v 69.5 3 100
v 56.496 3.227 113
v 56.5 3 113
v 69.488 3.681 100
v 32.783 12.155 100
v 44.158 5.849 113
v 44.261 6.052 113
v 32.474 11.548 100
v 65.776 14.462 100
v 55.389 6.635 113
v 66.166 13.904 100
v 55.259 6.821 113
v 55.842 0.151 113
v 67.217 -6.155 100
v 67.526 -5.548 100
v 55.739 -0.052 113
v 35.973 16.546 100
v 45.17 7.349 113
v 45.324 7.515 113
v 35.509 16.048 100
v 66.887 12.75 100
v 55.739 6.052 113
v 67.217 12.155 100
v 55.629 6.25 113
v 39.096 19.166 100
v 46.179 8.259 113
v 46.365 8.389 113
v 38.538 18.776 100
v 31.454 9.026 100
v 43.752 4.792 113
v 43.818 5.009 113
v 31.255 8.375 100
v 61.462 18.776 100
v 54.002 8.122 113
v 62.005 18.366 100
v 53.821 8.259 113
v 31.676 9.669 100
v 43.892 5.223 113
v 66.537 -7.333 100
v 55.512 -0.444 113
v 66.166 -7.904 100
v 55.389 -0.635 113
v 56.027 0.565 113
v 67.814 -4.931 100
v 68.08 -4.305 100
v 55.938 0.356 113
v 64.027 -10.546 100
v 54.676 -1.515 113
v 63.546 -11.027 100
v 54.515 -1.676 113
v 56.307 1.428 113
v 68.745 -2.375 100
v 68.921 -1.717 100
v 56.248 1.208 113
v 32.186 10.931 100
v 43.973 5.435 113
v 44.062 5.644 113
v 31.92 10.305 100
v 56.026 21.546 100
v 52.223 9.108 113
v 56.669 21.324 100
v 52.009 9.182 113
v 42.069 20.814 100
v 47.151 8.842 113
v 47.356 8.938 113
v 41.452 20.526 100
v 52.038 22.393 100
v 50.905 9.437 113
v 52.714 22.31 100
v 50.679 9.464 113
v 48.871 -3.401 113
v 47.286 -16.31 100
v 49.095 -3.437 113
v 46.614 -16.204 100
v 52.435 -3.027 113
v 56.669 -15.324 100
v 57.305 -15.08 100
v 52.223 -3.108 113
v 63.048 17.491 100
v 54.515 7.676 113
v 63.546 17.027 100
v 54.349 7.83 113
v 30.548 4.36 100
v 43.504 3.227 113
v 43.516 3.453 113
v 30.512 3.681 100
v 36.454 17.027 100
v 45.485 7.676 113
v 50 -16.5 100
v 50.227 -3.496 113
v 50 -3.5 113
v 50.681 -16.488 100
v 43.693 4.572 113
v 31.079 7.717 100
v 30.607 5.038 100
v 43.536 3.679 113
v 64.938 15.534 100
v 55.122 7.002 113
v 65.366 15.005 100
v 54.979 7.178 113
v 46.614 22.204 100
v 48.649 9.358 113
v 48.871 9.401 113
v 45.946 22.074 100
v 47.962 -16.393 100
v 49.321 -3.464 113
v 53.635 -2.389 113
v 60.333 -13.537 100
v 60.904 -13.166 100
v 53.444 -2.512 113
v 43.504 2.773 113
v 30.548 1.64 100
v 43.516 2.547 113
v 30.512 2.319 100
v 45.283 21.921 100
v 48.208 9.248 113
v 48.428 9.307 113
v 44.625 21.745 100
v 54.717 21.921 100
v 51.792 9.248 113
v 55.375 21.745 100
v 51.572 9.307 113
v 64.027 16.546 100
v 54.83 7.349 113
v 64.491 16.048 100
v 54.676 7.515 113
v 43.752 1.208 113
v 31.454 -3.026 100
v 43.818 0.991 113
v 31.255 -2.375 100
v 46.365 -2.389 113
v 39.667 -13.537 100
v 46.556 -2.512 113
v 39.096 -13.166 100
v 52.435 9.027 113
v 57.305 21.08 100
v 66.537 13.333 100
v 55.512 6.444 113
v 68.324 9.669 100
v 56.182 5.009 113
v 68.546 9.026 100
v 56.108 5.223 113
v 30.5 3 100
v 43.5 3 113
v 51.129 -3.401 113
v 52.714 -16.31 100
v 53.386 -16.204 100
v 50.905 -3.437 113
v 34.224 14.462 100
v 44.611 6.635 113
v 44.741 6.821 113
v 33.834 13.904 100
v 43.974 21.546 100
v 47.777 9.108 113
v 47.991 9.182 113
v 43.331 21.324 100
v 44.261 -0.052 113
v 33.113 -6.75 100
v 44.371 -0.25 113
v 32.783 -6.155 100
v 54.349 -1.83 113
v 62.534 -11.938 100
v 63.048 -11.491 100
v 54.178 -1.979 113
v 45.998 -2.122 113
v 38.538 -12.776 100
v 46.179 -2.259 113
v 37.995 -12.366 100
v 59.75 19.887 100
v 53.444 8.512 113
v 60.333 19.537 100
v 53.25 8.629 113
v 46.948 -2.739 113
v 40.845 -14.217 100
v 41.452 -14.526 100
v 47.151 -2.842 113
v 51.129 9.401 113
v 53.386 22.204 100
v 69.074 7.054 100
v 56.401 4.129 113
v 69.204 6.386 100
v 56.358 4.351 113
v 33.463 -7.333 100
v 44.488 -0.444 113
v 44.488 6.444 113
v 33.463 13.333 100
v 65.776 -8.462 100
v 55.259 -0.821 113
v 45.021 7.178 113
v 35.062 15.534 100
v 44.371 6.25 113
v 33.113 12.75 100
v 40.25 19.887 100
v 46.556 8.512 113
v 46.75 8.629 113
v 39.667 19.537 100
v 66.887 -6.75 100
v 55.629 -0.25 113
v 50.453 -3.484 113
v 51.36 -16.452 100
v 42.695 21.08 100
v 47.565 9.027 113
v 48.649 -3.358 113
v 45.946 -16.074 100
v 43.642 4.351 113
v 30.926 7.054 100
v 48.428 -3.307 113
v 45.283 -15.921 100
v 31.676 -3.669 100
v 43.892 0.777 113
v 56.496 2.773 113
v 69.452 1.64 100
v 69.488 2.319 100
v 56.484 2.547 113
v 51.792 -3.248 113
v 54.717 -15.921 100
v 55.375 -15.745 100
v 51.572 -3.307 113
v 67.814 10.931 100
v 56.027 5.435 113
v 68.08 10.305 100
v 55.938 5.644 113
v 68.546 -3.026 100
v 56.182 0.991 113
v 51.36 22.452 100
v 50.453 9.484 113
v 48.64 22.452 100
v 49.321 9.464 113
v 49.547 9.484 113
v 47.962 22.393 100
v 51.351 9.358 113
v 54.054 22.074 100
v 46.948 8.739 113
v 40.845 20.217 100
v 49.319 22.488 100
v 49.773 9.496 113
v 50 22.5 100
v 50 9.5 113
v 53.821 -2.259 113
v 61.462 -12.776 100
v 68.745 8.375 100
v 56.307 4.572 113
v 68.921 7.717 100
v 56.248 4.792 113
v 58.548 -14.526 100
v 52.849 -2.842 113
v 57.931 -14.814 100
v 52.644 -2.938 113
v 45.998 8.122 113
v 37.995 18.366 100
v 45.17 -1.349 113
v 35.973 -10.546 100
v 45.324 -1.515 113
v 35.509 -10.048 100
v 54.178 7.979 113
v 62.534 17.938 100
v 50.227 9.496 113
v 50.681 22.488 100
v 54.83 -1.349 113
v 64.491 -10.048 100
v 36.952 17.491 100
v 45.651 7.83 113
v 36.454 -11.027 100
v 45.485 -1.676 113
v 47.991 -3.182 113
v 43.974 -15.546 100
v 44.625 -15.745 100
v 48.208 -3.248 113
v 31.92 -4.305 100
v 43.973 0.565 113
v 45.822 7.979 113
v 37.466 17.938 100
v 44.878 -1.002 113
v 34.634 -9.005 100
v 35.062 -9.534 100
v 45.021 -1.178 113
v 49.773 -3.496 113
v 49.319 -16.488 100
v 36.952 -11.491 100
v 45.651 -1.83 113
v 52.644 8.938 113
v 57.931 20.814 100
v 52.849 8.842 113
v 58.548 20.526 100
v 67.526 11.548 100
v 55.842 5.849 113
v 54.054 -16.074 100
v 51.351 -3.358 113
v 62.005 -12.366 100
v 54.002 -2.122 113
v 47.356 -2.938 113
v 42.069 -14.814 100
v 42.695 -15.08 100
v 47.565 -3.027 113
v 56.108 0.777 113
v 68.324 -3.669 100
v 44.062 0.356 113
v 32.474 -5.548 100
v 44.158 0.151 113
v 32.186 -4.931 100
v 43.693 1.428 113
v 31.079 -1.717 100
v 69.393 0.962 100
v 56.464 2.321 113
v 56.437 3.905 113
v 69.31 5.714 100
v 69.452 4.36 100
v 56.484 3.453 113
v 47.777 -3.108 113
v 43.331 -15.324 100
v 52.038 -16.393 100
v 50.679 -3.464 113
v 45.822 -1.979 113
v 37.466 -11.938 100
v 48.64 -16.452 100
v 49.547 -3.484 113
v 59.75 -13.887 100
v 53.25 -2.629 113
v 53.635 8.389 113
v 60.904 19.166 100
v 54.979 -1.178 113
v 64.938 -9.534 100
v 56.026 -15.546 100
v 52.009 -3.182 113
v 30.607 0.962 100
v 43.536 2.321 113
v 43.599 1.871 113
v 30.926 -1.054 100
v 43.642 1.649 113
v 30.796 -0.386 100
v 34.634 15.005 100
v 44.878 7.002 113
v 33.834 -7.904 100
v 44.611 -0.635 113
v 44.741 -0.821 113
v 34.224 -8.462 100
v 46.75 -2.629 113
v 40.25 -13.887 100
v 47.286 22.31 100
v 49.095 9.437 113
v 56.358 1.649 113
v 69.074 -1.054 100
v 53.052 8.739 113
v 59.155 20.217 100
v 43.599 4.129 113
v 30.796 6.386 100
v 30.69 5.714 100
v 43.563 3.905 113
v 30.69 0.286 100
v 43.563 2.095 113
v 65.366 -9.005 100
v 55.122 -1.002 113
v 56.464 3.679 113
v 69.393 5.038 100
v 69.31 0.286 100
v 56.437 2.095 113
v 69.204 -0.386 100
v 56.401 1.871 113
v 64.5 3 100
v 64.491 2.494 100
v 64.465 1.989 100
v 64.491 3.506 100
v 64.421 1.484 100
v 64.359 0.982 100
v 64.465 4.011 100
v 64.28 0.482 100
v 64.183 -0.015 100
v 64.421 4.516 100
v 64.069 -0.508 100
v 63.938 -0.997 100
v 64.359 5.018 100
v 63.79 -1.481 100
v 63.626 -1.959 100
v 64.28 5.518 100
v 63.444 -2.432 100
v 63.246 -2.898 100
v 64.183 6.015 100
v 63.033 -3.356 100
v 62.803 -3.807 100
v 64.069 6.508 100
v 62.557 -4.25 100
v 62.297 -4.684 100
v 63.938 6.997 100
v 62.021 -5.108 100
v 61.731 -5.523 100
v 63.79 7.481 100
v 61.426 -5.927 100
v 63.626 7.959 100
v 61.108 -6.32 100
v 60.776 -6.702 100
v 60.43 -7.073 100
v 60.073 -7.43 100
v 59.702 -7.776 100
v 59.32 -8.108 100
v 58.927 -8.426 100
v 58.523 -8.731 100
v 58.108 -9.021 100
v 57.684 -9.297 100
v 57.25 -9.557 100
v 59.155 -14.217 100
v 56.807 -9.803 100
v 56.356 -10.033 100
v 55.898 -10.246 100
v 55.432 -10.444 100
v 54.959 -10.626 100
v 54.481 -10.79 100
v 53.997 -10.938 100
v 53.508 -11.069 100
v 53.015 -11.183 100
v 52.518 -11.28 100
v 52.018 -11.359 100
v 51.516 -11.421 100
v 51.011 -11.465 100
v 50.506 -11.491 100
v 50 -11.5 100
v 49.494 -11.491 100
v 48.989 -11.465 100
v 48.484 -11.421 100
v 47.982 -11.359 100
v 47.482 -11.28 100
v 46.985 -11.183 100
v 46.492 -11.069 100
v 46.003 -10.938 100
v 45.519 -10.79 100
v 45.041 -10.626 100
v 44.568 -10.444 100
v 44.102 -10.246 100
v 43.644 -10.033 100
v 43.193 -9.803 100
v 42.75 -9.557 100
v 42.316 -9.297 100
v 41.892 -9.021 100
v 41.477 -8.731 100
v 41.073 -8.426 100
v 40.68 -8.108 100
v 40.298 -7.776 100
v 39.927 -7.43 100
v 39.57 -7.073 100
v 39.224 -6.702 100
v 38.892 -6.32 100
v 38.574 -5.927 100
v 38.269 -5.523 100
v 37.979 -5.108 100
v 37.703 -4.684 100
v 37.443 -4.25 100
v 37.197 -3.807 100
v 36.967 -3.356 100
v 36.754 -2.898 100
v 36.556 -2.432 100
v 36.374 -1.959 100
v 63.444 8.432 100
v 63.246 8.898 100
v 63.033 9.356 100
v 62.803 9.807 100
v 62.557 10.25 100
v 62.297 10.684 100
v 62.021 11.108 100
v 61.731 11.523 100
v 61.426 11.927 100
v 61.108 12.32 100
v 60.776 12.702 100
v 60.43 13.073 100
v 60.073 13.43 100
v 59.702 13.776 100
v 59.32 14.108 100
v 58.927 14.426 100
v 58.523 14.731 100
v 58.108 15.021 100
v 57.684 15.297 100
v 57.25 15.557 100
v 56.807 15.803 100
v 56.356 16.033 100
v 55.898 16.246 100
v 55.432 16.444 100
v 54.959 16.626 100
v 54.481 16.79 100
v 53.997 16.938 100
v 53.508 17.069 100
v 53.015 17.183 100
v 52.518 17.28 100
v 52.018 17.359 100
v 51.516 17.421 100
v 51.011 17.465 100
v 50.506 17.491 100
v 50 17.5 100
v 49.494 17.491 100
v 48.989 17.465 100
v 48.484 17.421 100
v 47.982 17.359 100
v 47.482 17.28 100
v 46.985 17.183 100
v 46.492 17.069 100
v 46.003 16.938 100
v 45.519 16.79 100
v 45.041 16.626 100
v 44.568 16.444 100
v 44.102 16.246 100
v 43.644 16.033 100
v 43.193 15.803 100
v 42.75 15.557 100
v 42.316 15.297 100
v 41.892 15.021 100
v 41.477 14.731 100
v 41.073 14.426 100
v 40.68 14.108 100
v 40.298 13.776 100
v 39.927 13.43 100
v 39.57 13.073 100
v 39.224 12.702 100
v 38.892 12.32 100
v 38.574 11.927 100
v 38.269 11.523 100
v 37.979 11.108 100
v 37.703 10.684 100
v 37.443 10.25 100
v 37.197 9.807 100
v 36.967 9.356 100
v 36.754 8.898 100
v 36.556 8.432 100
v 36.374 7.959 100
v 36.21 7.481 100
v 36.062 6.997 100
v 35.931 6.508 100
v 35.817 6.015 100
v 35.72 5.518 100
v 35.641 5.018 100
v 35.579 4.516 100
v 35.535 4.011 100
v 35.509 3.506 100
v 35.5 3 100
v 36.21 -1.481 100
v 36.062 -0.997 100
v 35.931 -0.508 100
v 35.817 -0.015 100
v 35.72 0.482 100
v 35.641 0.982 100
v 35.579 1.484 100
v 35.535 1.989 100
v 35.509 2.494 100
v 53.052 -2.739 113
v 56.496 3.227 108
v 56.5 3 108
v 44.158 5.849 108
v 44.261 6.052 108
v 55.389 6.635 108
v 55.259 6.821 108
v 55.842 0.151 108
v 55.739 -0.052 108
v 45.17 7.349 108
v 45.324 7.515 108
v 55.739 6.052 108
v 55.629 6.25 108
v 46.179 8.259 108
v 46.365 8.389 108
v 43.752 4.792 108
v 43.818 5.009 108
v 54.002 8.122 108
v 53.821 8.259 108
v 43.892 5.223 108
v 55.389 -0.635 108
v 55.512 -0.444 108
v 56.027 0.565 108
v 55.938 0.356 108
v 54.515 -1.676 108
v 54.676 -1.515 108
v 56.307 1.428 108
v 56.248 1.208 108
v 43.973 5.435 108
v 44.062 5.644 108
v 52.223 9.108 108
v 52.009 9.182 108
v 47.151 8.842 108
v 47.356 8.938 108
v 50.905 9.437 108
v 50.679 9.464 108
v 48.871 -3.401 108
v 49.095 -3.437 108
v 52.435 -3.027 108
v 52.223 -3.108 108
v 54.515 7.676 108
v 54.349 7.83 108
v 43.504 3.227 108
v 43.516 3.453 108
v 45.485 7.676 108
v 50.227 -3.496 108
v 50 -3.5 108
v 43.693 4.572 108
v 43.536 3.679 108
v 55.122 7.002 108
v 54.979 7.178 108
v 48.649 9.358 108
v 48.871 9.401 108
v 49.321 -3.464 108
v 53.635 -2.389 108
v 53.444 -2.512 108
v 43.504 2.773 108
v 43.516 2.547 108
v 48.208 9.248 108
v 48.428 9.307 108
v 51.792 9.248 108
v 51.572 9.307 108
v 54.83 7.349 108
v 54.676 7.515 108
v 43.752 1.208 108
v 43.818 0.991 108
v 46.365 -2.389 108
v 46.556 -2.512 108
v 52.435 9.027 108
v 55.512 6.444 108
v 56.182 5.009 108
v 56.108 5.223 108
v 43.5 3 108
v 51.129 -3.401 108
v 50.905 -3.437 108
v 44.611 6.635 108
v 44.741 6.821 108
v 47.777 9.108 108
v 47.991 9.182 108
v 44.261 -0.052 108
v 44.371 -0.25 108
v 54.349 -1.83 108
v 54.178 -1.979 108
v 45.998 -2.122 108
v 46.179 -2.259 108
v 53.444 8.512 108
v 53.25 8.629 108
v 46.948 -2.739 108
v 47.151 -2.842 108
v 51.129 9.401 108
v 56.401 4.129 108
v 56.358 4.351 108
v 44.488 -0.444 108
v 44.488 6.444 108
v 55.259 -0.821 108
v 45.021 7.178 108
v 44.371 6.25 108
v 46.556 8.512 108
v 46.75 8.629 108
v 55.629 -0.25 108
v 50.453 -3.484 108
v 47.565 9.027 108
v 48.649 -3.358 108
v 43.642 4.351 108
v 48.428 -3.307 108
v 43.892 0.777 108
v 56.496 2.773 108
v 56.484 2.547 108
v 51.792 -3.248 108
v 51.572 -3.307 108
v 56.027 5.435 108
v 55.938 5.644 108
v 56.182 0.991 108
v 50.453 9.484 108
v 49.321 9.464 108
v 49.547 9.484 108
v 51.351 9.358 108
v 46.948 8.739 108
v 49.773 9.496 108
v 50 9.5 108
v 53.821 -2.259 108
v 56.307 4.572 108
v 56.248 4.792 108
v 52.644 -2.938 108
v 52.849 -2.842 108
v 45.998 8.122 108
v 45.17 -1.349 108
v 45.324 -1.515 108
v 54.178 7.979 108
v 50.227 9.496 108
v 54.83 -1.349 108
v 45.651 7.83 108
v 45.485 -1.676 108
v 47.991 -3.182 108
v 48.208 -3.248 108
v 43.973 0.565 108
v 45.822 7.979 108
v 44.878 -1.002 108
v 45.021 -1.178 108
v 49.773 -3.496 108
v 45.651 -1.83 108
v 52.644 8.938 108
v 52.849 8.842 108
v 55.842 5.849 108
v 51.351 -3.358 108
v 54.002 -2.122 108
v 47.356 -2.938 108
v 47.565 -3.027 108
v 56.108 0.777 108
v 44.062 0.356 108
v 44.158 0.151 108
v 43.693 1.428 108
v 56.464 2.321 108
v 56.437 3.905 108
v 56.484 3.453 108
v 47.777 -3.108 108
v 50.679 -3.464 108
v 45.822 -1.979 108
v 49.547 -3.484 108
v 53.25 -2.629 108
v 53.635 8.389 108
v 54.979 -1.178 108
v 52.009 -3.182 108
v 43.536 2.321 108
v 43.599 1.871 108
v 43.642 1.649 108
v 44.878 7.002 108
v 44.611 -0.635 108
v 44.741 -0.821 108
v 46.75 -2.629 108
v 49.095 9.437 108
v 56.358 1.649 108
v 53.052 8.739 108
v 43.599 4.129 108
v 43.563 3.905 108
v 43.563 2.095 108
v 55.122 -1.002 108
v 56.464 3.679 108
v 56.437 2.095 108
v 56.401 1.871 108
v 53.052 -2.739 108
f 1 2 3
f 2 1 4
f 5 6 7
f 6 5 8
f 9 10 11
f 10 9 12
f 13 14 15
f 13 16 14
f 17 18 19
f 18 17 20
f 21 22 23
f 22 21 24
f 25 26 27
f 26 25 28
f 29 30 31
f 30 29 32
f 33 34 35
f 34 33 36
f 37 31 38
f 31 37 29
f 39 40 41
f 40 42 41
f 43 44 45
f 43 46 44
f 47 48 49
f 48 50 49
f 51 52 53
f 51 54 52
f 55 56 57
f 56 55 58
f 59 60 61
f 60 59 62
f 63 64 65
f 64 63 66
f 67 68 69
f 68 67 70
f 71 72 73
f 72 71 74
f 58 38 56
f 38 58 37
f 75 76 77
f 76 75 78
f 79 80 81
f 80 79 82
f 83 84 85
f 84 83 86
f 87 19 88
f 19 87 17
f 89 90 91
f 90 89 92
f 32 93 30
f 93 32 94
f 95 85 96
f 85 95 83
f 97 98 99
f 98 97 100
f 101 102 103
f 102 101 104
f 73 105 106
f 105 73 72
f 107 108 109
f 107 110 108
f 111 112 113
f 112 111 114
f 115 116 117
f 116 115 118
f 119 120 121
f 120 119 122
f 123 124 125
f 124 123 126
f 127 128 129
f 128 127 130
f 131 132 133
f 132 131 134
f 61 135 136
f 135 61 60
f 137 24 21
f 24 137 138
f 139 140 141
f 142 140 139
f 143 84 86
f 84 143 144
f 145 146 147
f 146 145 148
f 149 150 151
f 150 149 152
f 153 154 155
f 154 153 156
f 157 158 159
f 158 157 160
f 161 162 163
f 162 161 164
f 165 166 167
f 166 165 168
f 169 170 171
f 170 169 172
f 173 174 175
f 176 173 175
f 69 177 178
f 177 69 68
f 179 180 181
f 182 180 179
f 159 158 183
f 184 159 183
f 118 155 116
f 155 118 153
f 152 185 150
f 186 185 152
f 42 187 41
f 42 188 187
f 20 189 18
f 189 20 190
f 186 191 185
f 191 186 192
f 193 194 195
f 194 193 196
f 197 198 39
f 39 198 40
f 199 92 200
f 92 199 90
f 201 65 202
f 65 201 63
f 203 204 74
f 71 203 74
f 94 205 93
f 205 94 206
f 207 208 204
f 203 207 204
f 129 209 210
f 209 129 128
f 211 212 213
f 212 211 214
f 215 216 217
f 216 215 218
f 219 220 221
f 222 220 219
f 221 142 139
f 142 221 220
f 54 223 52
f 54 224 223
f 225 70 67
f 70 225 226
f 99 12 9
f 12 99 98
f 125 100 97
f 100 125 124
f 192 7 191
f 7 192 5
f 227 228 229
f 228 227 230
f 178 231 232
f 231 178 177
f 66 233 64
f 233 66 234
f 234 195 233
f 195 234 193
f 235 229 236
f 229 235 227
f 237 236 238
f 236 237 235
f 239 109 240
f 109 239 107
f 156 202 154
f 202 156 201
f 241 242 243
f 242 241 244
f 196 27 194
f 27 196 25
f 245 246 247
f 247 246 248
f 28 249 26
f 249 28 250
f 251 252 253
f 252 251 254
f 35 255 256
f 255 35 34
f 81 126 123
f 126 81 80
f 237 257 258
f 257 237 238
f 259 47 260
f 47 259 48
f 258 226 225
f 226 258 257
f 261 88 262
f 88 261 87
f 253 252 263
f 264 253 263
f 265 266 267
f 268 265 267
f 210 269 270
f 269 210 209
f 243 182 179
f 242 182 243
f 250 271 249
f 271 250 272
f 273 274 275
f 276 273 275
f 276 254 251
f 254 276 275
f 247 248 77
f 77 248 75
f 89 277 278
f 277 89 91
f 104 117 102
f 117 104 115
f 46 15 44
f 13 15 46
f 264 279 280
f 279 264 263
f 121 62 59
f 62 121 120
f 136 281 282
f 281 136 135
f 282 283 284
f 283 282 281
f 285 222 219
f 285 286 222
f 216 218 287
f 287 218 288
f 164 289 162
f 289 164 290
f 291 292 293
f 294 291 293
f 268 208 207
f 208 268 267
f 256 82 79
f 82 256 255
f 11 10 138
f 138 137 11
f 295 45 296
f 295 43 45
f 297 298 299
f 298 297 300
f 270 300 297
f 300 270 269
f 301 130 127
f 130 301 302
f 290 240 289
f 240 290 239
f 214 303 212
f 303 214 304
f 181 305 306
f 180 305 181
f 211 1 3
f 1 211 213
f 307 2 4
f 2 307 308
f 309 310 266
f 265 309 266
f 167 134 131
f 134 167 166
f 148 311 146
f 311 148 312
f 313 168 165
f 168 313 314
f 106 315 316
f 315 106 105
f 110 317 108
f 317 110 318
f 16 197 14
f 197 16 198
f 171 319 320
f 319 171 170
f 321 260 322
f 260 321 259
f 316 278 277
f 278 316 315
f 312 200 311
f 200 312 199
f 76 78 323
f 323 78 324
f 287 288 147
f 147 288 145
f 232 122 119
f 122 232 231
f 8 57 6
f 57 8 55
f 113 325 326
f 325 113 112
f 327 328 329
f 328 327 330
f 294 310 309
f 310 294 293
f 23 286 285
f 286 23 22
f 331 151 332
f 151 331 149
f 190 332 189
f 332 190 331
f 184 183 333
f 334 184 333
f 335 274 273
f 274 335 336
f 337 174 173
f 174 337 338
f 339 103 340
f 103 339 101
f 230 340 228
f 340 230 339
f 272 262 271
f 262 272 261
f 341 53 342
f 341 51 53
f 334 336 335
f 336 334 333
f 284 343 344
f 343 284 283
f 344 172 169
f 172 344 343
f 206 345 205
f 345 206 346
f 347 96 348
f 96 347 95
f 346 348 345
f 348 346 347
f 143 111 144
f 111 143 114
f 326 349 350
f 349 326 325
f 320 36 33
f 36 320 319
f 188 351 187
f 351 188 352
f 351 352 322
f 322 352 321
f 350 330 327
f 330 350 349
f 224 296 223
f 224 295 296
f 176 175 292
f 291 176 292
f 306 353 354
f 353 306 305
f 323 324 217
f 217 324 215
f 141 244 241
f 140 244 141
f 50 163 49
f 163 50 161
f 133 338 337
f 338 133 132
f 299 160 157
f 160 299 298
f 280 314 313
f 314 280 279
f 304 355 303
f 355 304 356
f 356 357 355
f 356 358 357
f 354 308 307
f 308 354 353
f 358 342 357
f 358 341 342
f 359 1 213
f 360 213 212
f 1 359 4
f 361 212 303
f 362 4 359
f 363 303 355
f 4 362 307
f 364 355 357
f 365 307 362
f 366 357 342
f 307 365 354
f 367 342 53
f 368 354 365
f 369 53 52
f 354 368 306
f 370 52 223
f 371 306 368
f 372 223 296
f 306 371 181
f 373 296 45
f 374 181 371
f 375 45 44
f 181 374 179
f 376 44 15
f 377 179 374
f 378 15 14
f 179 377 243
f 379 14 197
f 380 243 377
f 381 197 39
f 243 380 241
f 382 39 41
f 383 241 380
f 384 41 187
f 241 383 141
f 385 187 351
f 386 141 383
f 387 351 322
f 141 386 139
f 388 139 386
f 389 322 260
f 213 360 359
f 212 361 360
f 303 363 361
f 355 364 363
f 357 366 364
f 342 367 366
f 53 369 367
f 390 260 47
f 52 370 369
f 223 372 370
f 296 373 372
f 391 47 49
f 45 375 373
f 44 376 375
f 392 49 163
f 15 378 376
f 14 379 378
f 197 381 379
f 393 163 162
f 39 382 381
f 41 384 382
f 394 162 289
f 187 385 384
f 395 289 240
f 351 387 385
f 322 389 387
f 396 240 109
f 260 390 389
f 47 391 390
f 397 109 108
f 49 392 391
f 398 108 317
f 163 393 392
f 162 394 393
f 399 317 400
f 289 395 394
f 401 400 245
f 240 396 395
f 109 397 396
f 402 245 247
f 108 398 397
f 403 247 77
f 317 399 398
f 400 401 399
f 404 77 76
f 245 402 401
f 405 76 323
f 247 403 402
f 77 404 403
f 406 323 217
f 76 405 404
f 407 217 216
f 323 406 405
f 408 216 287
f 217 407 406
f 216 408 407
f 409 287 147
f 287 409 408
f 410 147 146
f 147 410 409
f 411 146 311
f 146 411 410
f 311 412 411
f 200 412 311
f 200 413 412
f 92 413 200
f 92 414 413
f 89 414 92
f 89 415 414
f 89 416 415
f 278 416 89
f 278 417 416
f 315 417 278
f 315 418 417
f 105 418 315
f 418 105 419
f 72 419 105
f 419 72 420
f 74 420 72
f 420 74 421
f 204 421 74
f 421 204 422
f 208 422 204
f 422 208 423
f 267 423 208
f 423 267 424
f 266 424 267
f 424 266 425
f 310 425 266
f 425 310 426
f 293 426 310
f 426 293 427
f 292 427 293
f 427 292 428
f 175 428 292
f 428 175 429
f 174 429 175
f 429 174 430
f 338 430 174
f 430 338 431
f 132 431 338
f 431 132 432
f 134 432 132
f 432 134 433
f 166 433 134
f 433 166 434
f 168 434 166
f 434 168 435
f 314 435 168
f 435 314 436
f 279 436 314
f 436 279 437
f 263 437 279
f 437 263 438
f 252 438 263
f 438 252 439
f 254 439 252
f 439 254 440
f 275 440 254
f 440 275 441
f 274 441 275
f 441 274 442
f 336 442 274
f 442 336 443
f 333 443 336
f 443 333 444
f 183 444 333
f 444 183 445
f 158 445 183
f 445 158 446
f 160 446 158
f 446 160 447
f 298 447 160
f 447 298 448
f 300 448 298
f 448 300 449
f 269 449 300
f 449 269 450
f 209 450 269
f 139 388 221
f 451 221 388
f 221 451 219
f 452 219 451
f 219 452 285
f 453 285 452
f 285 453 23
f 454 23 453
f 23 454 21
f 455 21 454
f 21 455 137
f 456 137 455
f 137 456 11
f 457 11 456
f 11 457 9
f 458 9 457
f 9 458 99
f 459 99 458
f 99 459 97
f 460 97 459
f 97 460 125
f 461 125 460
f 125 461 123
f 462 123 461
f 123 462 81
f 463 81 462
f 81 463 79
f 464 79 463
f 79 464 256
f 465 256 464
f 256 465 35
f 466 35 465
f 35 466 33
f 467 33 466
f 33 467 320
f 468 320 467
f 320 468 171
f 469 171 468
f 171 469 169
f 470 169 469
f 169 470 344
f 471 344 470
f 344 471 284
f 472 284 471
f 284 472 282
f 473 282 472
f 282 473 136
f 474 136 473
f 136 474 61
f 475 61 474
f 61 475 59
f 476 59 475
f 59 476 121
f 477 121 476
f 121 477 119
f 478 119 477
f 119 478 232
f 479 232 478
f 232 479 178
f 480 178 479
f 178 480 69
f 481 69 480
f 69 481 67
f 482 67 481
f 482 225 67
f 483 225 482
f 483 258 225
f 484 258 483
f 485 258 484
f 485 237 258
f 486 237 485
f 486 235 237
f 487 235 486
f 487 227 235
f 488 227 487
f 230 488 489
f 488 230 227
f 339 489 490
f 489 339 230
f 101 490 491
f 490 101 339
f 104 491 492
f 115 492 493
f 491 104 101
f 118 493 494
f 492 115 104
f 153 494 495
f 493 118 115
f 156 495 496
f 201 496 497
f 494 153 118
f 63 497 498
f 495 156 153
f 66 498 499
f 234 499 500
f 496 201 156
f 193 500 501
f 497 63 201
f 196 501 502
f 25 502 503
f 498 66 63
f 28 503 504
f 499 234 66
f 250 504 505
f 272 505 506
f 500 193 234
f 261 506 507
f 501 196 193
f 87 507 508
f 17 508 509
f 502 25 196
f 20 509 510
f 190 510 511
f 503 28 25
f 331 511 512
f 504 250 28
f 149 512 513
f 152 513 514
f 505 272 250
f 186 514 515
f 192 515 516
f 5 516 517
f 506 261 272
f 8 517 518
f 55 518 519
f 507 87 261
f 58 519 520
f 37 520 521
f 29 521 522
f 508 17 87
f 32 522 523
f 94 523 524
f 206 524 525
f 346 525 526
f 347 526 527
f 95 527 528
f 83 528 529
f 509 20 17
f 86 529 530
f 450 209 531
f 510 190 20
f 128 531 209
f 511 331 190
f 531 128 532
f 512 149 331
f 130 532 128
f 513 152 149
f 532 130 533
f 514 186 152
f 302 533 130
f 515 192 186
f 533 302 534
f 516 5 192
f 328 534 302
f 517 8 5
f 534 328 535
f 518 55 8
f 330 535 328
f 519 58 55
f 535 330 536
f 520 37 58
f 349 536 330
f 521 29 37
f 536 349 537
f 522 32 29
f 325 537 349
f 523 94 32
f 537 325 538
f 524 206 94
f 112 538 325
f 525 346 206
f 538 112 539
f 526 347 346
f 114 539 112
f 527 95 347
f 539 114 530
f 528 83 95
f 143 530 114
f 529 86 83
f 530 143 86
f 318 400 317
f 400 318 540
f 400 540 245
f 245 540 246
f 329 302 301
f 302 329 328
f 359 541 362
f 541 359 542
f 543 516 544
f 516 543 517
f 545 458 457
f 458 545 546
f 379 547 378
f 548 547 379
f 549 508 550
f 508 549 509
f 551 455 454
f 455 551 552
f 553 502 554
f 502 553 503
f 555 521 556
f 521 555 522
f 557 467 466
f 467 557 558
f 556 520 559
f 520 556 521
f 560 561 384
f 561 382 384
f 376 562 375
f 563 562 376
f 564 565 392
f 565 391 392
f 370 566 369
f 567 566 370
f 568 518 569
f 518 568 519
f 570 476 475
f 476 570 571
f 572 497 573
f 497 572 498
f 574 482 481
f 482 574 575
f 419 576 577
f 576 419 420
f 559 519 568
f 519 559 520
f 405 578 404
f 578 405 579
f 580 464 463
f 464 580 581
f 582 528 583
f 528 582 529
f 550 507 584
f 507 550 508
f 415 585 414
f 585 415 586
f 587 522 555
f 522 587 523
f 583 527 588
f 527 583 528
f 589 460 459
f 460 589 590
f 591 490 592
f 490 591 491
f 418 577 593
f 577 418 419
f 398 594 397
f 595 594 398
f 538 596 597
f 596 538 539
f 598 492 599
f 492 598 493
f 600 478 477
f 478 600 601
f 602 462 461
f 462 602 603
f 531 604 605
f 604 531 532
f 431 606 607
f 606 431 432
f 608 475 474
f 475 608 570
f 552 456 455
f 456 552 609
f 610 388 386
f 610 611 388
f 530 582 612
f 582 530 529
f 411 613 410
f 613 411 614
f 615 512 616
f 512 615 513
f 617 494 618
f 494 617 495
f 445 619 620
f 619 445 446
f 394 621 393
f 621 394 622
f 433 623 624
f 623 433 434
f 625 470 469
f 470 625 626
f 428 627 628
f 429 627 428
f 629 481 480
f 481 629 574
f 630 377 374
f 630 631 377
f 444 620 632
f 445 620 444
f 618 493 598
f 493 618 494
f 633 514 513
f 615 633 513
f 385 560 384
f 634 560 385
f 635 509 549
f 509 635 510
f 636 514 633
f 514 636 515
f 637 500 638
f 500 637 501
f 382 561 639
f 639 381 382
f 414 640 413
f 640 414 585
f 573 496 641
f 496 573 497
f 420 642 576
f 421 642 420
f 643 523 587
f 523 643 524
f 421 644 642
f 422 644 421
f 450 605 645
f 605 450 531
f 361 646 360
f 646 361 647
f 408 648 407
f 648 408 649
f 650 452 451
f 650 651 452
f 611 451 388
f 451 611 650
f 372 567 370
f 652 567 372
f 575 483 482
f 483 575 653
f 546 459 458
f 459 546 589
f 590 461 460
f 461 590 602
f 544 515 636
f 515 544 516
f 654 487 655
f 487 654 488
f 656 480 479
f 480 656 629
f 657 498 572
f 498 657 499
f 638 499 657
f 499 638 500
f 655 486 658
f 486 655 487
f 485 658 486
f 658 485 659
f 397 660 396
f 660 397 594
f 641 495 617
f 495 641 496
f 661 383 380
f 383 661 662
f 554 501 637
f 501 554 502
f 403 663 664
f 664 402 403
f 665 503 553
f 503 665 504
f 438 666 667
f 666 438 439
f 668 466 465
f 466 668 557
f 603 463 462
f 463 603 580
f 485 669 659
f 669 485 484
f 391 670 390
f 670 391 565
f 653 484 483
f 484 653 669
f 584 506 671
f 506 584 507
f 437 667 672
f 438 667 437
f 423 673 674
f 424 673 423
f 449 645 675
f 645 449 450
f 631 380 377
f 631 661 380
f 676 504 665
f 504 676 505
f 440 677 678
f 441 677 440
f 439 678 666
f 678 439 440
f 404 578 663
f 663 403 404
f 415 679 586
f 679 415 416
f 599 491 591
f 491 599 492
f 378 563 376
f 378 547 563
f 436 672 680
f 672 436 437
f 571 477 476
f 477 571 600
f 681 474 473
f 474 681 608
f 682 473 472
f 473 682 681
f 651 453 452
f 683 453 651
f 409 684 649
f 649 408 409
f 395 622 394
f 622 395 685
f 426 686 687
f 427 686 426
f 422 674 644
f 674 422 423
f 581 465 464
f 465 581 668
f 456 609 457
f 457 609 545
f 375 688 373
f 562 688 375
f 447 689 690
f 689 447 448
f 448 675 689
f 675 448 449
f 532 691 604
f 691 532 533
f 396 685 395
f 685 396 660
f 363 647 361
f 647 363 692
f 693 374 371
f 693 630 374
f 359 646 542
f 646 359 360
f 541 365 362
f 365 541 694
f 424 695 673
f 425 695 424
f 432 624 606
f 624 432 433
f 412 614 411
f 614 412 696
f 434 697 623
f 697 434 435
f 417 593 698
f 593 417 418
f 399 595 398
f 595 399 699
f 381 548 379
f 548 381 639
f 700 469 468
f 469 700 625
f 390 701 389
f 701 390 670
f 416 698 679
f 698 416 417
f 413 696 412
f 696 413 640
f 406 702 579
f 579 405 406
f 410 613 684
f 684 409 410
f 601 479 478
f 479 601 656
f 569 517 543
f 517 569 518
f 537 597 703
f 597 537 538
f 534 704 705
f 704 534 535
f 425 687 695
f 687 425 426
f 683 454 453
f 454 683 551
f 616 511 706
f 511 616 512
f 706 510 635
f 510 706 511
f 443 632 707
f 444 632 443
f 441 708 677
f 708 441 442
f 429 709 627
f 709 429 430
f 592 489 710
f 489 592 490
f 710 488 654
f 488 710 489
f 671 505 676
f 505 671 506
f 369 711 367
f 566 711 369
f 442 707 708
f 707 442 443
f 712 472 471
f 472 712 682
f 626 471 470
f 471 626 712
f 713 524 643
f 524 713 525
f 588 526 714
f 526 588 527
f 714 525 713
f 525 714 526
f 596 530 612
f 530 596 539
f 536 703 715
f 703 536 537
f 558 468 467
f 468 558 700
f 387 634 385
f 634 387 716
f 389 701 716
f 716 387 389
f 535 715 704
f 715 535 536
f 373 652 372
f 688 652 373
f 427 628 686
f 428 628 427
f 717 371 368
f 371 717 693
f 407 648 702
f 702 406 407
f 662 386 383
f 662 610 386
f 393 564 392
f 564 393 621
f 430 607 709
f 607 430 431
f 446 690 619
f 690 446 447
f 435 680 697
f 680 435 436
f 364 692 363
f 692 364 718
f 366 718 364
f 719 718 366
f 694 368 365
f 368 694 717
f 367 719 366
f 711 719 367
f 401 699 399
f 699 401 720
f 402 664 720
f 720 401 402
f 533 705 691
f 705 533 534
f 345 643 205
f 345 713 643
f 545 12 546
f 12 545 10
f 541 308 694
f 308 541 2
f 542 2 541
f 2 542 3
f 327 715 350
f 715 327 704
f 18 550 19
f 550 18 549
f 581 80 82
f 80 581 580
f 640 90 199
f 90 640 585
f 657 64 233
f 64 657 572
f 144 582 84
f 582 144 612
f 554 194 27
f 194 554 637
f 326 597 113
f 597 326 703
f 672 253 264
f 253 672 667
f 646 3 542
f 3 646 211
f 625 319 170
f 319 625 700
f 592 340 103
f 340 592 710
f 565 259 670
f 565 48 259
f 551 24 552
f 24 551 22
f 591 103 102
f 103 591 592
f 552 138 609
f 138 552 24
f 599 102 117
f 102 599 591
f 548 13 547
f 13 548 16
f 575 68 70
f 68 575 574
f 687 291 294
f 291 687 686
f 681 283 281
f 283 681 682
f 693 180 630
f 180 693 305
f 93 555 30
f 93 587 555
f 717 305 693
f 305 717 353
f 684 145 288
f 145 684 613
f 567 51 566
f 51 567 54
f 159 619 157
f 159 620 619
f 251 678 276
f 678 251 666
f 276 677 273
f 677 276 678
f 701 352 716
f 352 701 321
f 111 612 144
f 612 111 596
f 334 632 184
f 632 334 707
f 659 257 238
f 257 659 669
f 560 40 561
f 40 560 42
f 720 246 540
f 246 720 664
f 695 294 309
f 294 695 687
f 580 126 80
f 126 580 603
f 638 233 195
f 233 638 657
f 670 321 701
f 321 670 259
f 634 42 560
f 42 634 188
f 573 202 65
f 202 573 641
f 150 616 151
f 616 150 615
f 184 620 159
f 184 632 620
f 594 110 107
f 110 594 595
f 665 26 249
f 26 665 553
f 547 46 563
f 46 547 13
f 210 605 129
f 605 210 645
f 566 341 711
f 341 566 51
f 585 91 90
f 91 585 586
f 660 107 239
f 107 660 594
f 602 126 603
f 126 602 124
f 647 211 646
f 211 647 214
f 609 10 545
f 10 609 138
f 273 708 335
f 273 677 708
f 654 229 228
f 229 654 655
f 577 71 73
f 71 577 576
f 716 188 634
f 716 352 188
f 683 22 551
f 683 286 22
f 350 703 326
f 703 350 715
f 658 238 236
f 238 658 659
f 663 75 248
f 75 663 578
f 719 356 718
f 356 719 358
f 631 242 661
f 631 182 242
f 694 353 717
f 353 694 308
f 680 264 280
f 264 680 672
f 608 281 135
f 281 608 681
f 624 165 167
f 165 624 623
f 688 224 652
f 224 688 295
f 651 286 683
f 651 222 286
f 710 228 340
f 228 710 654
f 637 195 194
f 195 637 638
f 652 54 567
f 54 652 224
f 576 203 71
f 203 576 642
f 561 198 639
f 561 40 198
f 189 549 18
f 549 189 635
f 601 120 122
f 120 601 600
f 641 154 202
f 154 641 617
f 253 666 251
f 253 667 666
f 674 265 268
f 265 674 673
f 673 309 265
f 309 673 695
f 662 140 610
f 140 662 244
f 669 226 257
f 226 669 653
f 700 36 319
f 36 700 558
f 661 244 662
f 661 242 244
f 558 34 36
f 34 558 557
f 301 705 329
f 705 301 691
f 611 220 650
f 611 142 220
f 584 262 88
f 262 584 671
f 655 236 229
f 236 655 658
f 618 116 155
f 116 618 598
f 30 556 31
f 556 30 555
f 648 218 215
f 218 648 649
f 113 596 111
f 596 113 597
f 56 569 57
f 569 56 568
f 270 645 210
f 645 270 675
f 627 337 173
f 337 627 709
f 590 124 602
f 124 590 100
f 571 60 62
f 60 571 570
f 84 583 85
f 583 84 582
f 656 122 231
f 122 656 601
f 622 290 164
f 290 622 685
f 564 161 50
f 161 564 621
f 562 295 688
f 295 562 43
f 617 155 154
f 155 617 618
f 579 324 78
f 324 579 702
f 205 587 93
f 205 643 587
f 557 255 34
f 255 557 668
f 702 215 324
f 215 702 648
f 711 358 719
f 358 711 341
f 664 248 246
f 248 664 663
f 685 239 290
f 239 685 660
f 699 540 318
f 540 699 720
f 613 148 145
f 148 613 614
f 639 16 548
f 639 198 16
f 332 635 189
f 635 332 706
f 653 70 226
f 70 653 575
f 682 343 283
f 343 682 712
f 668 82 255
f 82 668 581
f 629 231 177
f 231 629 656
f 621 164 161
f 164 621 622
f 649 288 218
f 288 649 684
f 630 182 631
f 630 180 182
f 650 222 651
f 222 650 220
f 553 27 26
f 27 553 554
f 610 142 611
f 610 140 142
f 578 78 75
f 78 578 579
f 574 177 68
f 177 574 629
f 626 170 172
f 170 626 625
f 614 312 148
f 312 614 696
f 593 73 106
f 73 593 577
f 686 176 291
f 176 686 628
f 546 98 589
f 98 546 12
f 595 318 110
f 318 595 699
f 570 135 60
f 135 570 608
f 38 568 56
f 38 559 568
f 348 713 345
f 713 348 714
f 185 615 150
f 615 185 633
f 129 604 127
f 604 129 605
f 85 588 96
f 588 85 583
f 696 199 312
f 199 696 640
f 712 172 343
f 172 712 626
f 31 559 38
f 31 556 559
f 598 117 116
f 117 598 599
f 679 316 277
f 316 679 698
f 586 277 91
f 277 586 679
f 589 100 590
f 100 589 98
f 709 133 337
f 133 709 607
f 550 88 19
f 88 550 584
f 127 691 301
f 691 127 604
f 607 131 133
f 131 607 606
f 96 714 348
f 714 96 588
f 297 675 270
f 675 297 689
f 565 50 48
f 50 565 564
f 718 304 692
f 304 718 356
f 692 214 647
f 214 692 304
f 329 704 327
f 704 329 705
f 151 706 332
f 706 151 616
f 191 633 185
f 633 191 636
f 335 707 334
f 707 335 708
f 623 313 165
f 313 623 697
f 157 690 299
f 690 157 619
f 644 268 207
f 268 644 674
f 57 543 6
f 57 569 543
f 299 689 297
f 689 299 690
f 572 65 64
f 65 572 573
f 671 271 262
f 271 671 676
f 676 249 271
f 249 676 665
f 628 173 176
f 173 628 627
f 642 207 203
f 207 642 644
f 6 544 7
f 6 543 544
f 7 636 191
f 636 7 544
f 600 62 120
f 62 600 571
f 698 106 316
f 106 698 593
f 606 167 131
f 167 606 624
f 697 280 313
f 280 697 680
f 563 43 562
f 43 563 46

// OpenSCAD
// Generated by SolidPython 1.1.1 on 2022-02-01 14:05:48
$fa = 2;
$fs = 0.1;
$fn = 0;


translate(v = [50, 3, 100.0000000000]) {
	difference() {
		cylinder(d1 = 39, d2 = 0, h = 19.5000000000);
		translate(v = [0, 0, -5]) {
			cylinder(d1 = 39, d2 = 0, h = 19.5000000000);
		}
		cylinder(d = 13, h = 29.5000000000);
	}
}
/***********************************************
*********      SolidPython code:      **********
************************************************
 
from vent import *

box_width = 60
box_height = 200#148
box_length = 180
box_shell_thickness = 5

bolt_size = 4
bolt_outer_radius = 10/2

fitting_tolerance = 1

printing_support_thickness = 0.8

bracket_thickness = box_shell_thickness
sensecap_width = 40 + 1  # +1 for easy fitting
top_bracket_offset = 27 + box_shell_thickness
top_bracket_clamp_height = 8
top_bracket_clamp_width = (box_width - sensecap_width) / 2
top_bracket_height = top_bracket_offset + top_bracket_clamp_height
top_bracket_spacing = 132
sensecap_length = 154 + 1  # +1 for easy fitting
top_bracket_side_width = (box_length - sensecap_length) / 2
top_bracket_top_length = (box_length - top_bracket_spacing)/2
bottom_bracket_clamp_length = 15
bottom_bracket_length = top_bracket_side_width + bottom_bracket_clamp_length
bottom_bracket_offset = 110

charger_length = 28
charger_width = 43
charger_height = 64
charger_plug_height = 40

power_cable_hole_diameter = 10
power_cable_hole_support_diameter = power_cable_hole_diameter + 2 * 10
eth_cable_hole_diameter = 6
eth_cable_hole_support_diameter = eth_cable_hole_diameter + 2 * 10

airial_offset_x = 50
airial_offset_y = 3
airial_diameter = 13
airial_cone_diameter = min(airial_diameter * 3, box_width)
airial_cone_height = airial_cone_diameter/2

mounting_bracket_plate_thickness = 5
mounting_bracket_plate_extra = 10
mounting_bracket_pole_diameter = 50
mounting_bracket_section_thickness = 10
mounting_bracket_length = mounting_bracket_pole_diameter / 2 + 2 * mounting_bracket_section_thickness + mounting_bracket_plate_thickness
mounting_bracket_width = mounting_bracket_pole_diameter + 2 * mounting_bracket_section_thickness
mounting_bracket_height = 3 * mounting_bracket_section_thickness
mounting_bracket_plate_height = 60 #mounting_bracket_height + 2*mounting_bracket_plate_extra +10 @ 50mm pole diameter
mounting_bracket_plate_width = 100 #mounting_bracket_width + 2*mounting_bracket_plate_extra +10 @ 50mm pole diameter
mounting_bracket_support_width = 20

# Create the box
box = cube((box_length,box_width,box_height), center=True)
box_inside =cube((box_length - 2 * box_shell_thickness, box_width, box_height), center=True)
box_inside = translate((0, 0, -box_shell_thickness))(box_inside)
outer_box = box - box_inside

# Create the vents
vent = vent_grid(box_length, box_height, box_shell_thickness, 10, 3, 2, 20)
vent1 = translate((0,(box_width-box_shell_thickness)/2,0))(vent)
vent2 = translate((0,-(box_width-box_shell_thickness)/2,0))(rotate(a=(0,0,180))(vent))
vents = vent1 + vent2

# Create the top brackets
bracket_side = cube((bracket_thickness, top_bracket_clamp_width, top_bracket_height), center=True)
translate_x = (top_bracket_spacing+bracket_thickness)/2
translate_y = (sensecap_width + top_bracket_clamp_width) / 2
translate_z = (box_height - top_bracket_height)/2
bracket_side1 = translate((translate_x,translate_y,translate_z))(bracket_side)
bracket_side2 = translate((translate_x,-translate_y,translate_z))(bracket_side)
bracket_side3 = cube((top_bracket_side_width, bracket_thickness, top_bracket_height), center=True)
bracket_side3 = translate(((box_length-top_bracket_side_width)/2,0,translate_z))(bracket_side3)
bracket_top = cube((bracket_thickness, box_width, top_bracket_offset), center=True)
bracket_top = translate((translate_x,0,(box_height - top_bracket_offset)/2))(bracket_top)
bracket_top_2 = cube((top_bracket_top_length, bracket_thickness, top_bracket_offset), center=True)
bracket_top_2 = translate(((box_length-top_bracket_top_length)/2,0,(box_height - top_bracket_offset)/2))(bracket_top_2)
bracket_1 = bracket_side1 + bracket_side2 + bracket_side3 + bracket_top + bracket_top_2
bracket_2 = rotate(a=(0,0,180))(bracket_1)

# Create the bottom brackets
bracket_clamp = cube((bottom_bracket_length, top_bracket_clamp_width, bracket_thickness), center=True)
translate_x = (box_length - bottom_bracket_length)/2
translate_y = (box_width - top_bracket_clamp_width)/2
translate_z = (box_height - bracket_thickness)/2 - bottom_bracket_offset
bracket_clamp1 = translate((translate_x,translate_y,translate_z))(bracket_clamp)
bracket_clamp2 = translate((translate_x,-translate_y,translate_z))(bracket_clamp)
bracket_bridge = cube((top_bracket_side_width, box_width, bracket_thickness), center=True)
bracket_bridge = translate(((box_length-top_bracket_side_width)/2,0,translate_z))(bracket_bridge)
bottom_bracket1 = bracket_clamp1 + bracket_clamp2 + bracket_bridge
bottom_bracket2 = rotate(a=(0,0,180))(bottom_bracket1)

# Add the brackets to the box
box_with_vents = outer_box + vents + bracket_1 + bracket_2 + bottom_bracket1 + bottom_bracket2

# Remove the large airial hole from the box
large_airial_hole = cylinder(h=airial_cone_height,d1=airial_cone_diameter,d2=0)
large_airial_hole = translate((airial_offset_x, airial_offset_y, box_height / 2 - box_shell_thickness))(large_airial_hole)
box_with_vents -=  large_airial_hole

# Create the airial cone
outer_cone = cylinder(h=airial_cone_height, d1=airial_cone_diameter, d2=0)
inner_cone = translate((0,0,-box_shell_thickness))(cylinder(h=airial_cone_height, d1=airial_cone_diameter, d2=0))
small_airial_hole = cylinder(d=airial_diameter, h=airial_cone_height+2*box_shell_thickness)
airial_cone = outer_cone - inner_cone - small_airial_hole
airial_cone = translate((airial_offset_x, airial_offset_y, box_height / 2))(airial_cone)

# Create the mounting bracket
mounting_bracket = cube((mounting_bracket_width, mounting_bracket_length, mounting_bracket_height), center=True)
pipe_hole = translate((0,-mounting_bracket_length/2,-mounting_bracket_height/2))(cylinder(d=mounting_bracket_pole_diameter,h=mounting_bracket_height))
middle_cube = cube((mounting_bracket_width, mounting_bracket_length-mounting_bracket_plate_thickness, mounting_bracket_section_thickness), center=True)
middle_cube = translate((0,-mounting_bracket_plate_thickness/2,0))(middle_cube)
middle_hole = cube((mounting_bracket_pole_diameter, mounting_bracket_pole_diameter/2, mounting_bracket_section_thickness), center=True)
middle_hole = translate((0,-mounting_bracket_pole_diameter/4,0))(middle_hole)
middle_hole += translate((0,0,-mounting_bracket_section_thickness/2))(cylinder(d=mounting_bracket_pole_diameter,h=mounting_bracket_section_thickness))
middle_hole = translate((0,-mounting_bracket_length/2 + mounting_bracket_section_thickness,0))(middle_hole)
mounting_plate = cube((mounting_bracket_plate_width, mounting_bracket_plate_thickness, mounting_bracket_plate_height), center=True)
# Add the mounting plate to the box
box_with_vents += translate((0,-(box_width-mounting_bracket_plate_thickness)/2,0))(mounting_plate)
# Add supports for the mounting plate
supp1 = cube((mounting_bracket_support_width, box_shell_thickness, box_height), center=True)
supp2 = cube((box_length, box_shell_thickness, mounting_bracket_support_width), center=True)
supps = supp1 +supp2
supps = translate((0,-(box_width-box_shell_thickness)/2,0))(supps)
box_with_vents += supps
# Create the holes for the mounting bracket
bracket_hole = down((box_shell_thickness+mounting_bracket_plate_thickness)/2)(cylinder(d=bolt_size,h=box_shell_thickness+mounting_bracket_plate_thickness))
bracket_hole = rotate(a=(90,0,0))(bracket_hole)
bracket_hole = translate((0,-box_width/2,0))(bracket_hole)
bracket_hole1 = translate(((mounting_bracket_plate_width / 2 - bolt_outer_radius), 0, (mounting_bracket_plate_height / 2 - bolt_outer_radius)))(bracket_hole)
bracket_hole2 = translate((-(mounting_bracket_plate_width / 2 - bolt_outer_radius), 0, (mounting_bracket_plate_height / 2 - bolt_outer_radius)))(bracket_hole)
bracket_hole3 = translate((-(mounting_bracket_plate_width / 2 - bolt_outer_radius), 0, -(mounting_bracket_plate_height / 2 - bolt_outer_radius)))(bracket_hole)
bracket_hole4 = translate(((mounting_bracket_plate_width / 2 - bolt_outer_radius), 0, -(mounting_bracket_plate_height / 2 - bolt_outer_radius)))(bracket_hole)
bracket_holes = bracket_hole1 + bracket_hole2 + bracket_hole3 + bracket_hole4

mounting_plate = translate((0,(mounting_bracket_length - mounting_bracket_plate_thickness)/2,0))(mounting_plate)
mounting_bracket = mounting_bracket - pipe_hole - (middle_cube-middle_hole) + mounting_plate
mounting_bracket = translate((0,-(mounting_bracket_length+box_width)/2,0))(mounting_bracket)

# Add the holes to the mounting bracket and the backplate
mounting_bracket -= bracket_holes
box_with_vents -= bracket_holes

# Create the bottom plate
bottom_plate = horizontal_vent(box_length, box_width, box_shell_thickness, 10, 3, 2)
bottom_plate = translate((0,0,-box_height/2 - box_shell_thickness/2))(bottom_plate)
bottom_plate_mounting_point = cube((bolt_outer_radius*2,bolt_outer_radius*2,box_shell_thickness),center=True)
bottom_plate_mounting_point -= translate((0,0,-box_shell_thickness/2))(cylinder(d=bolt_size,h=box_shell_thickness))
mnt1 = translate(((box_length/2+bolt_outer_radius),(box_width/2-bolt_outer_radius),-(box_height + box_shell_thickness)/2))(bottom_plate_mounting_point)
mnt2 = translate(((box_length/2+bolt_outer_radius),-(box_width/2-bolt_outer_radius),-(box_height + box_shell_thickness)/2))(bottom_plate_mounting_point)
mnt3 = translate((-(box_length/2+bolt_outer_radius),-(box_width/2-bolt_outer_radius),-(box_height + box_shell_thickness)/2))(bottom_plate_mounting_point)
mnt4 = translate((-(box_length/2+bolt_outer_radius),(box_width/2-bolt_outer_radius),-(box_height + box_shell_thickness)/2))(bottom_plate_mounting_point)
mounts = mnt1 + mnt2 + mnt3 + mnt4
bottom_plate += mounts
# Add a supported hole for the power cable
power_cable_support = cylinder(d=power_cable_hole_support_diameter, h=box_shell_thickness)
power_cable_support = translate((-(box_length - power_cable_hole_support_diameter) / 2 + box_shell_thickness,
								 -(box_width - power_cable_hole_support_diameter) / 2 + box_shell_thickness,
								 -box_height / 2 - box_shell_thickness))(power_cable_support)
power_cable_hole = cylinder(d=power_cable_hole_diameter, h=box_shell_thickness)
power_cable_hole = translate((-(box_length - power_cable_hole_support_diameter) / 2 + box_shell_thickness,
							  -(box_width - power_cable_hole_support_diameter) / 2 + box_shell_thickness,
							  -box_height / 2 - box_shell_thickness))(power_cable_hole)

# Add a supported hole for the ethernet cable
eth_cable_support = cylinder(d=eth_cable_hole_support_diameter, h=box_shell_thickness)
eth_cable_support = translate((-(box_length - eth_cable_hole_support_diameter)/2 + box_shell_thickness + power_cable_hole_support_diameter,
								 -(box_width - eth_cable_hole_support_diameter)/2 + box_shell_thickness,
								 -box_height / 2 - box_shell_thickness))(eth_cable_support)
eth_cable_hole = cylinder(d=eth_cable_hole_diameter, h=box_shell_thickness)
eth_cable_hole = translate((-(box_length - eth_cable_hole_support_diameter) / 2 + box_shell_thickness + power_cable_hole_support_diameter,
							  -(box_width - eth_cable_hole_support_diameter) / 2 + box_shell_thickness,
							  -box_height / 2 - box_shell_thickness))(eth_cable_hole)
cable_support = hull()(power_cable_support,eth_cable_support)
bottom_plate = bottom_plate + cable_support - eth_cable_hole - power_cable_hole
# Create a bracket for holding the charger
charger_box = cube((charger_length + box_shell_thickness,
					box_width-2*box_shell_thickness - fitting_tolerance,
					charger_height-box_shell_thickness),center=True)
charger_box -= translate((box_shell_thickness/2,0,0))(cube((charger_length,charger_width,charger_height),center=True))
charger_box -= down((charger_height-charger_plug_height)/2)(cube((charger_length + box_shell_thickness,charger_width,charger_plug_height),center=True))
charger_box = translate((box_length/2 - box_shell_thickness - (charger_length + box_shell_thickness)/2,
						 0,
						 -(box_height-(charger_height-box_shell_thickness))/2))(charger_box)
bottom_plate += charger_box

# Add mounting points for the bottom plate to the box
box_with_vents += translate((0,0,box_shell_thickness))(mounts)
# Add supports for the mounts
support = cube((bolt_outer_radius*2,bolt_outer_radius*2,bolt_outer_radius*2),center=True)
triangle_cut = cube((bolt_outer_radius*2*sqrt(2),bolt_outer_radius*2,bolt_outer_radius*2),center=False)
triangle_cut = rotate(a=(0,45,0))(triangle_cut)
triangle_cut = translate((-bolt_outer_radius,-bolt_outer_radius,bolt_outer_radius))(triangle_cut)
support -= triangle_cut
middle_cut = cube(((bolt_outer_radius)*2,(bolt_outer_radius-printing_support_thickness)*2,(bolt_outer_radius)*2),center=True)
support -= middle_cut
sup1 = translate(((box_length/2+bolt_outer_radius),(box_width/2-bolt_outer_radius),(-box_height/2+bolt_outer_radius+box_shell_thickness)))(support)
sup2 = translate(((box_length/2+bolt_outer_radius),-(box_width/2-bolt_outer_radius),(-box_height/2+bolt_outer_radius+box_shell_thickness)))(support)
supps = sup1 + sup2
supps += rotate(a=(0,0,180))(supps)

test = bottom_plate + box_with_vents

# For printing -  This will ensure sufficient quality for printing
#$fs = 0.1  filament size/2
#$fa = 1

quality_directive = '$fa = 2;\n$fs = 0.1;\n$fn = 0;'
scad_render_to_file(box_with_vents, file_header=quality_directive, filepath='renders/sensecap_box.scad')
scad_render_to_file(airial_cone, file_header=quality_directive, filepath='renders/sensecap_cone.scad')
scad_render_to_file(mounting_bracket, file_header=quality_directive, filepath='renders/sensecap_mounting_bracket.scad')
scad_render_to_file(bottom_plate, file_header=quality_directive, filepath='renders/sensecap_bottom_plate.scad')

scad_render_to_file(test, file_header=quality_directive, filepath='renders/sensecap_test.scad') 
 
************************************************/
